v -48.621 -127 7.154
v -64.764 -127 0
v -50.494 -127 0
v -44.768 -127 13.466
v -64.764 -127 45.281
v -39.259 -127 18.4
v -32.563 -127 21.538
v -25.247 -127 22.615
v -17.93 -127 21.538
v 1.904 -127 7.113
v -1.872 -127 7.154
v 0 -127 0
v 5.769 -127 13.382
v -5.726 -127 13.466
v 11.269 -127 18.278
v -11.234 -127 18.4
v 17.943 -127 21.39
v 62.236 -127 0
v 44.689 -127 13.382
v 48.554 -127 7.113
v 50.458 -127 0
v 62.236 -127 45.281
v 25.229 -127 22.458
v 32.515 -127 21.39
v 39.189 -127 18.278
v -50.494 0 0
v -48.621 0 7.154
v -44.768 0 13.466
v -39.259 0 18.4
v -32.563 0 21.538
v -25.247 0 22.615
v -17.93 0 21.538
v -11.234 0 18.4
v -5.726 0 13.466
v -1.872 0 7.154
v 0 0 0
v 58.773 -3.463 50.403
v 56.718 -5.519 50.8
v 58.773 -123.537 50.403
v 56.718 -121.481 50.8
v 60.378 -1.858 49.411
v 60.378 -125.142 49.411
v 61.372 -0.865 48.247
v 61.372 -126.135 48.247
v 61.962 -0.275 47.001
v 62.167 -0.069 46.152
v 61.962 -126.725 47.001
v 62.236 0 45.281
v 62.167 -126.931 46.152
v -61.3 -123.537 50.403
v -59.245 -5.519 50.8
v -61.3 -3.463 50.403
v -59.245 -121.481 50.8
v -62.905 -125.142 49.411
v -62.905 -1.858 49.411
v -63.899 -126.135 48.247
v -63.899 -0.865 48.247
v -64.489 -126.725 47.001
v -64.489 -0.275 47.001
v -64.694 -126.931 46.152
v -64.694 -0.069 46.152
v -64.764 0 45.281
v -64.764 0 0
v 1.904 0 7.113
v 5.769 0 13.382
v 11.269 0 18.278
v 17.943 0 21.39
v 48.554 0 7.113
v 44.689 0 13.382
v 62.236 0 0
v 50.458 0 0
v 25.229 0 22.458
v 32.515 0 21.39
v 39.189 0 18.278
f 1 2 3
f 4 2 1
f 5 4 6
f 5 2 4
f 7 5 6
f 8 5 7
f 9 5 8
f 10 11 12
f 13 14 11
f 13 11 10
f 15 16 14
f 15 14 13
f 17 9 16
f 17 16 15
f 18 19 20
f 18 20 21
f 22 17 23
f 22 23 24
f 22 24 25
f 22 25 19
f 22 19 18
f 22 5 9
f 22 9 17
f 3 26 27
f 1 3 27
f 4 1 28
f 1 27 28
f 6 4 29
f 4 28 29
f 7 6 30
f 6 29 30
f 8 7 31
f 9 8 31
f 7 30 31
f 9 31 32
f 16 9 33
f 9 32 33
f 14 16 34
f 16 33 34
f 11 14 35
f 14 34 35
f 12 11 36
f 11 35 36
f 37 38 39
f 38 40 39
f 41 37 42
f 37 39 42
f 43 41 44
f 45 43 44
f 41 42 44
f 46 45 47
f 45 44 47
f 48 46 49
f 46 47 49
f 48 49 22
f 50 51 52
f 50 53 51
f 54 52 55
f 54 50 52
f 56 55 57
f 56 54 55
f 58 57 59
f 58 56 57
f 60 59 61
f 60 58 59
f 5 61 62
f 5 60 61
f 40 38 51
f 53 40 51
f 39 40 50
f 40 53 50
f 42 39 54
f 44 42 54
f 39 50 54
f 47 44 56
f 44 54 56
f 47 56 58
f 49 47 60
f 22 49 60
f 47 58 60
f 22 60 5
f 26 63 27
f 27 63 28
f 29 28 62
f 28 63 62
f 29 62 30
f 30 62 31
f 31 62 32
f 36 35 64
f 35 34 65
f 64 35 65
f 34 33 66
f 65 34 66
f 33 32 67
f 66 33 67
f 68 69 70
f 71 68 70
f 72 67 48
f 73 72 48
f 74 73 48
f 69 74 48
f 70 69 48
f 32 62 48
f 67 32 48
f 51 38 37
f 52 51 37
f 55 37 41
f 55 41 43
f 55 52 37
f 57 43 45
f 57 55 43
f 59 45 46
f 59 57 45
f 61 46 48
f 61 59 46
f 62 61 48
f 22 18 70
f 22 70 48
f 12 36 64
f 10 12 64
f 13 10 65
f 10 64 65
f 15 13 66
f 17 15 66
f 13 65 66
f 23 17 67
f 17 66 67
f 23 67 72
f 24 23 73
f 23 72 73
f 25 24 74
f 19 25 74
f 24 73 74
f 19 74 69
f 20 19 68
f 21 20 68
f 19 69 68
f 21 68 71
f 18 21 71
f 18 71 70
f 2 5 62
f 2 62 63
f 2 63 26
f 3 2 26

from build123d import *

# Parameters (mm, degrees)
F1_DEPTH = 127
F2_R     = 5.518892


with BuildPart() as f1:
    # F0 (on Front) → F1 (new body)
    with BuildSketch(Plane.XZ):
        with BuildLine():
            Line((62.236424, 50.8), (-64.763576, 50.8))
            Line((-64.763576, 50.8), (-64.763576, 0))
            Line((-64.763576, 0), (-50.493699, 0))
            ThreePointArc((-50.493699, 0), (-25.246849, 22.614934), (0, 0))
            ThreePointArc((0, 0), (25.229008, 22.457695), (50.458016, 0))
            Line((50.458016, 0), (62.236424, 0))
            Line((62.236424, 0), (62.236424, 50.8))
        make_face()
    extrude(amount=F1_DEPTH)

    # F2
    f2_edges = [f1.edges().sort_by_distance(p)[0] for p in [
        (-1.263576, 0, 50.8),
        (-64.763576, -63.5, 50.8),
        (-1.263576, -127, 50.8),
        (62.236424, -63.5, 50.8),
    ]]
    fillet(f2_edges, radius=F2_R)


solid = f1.part
